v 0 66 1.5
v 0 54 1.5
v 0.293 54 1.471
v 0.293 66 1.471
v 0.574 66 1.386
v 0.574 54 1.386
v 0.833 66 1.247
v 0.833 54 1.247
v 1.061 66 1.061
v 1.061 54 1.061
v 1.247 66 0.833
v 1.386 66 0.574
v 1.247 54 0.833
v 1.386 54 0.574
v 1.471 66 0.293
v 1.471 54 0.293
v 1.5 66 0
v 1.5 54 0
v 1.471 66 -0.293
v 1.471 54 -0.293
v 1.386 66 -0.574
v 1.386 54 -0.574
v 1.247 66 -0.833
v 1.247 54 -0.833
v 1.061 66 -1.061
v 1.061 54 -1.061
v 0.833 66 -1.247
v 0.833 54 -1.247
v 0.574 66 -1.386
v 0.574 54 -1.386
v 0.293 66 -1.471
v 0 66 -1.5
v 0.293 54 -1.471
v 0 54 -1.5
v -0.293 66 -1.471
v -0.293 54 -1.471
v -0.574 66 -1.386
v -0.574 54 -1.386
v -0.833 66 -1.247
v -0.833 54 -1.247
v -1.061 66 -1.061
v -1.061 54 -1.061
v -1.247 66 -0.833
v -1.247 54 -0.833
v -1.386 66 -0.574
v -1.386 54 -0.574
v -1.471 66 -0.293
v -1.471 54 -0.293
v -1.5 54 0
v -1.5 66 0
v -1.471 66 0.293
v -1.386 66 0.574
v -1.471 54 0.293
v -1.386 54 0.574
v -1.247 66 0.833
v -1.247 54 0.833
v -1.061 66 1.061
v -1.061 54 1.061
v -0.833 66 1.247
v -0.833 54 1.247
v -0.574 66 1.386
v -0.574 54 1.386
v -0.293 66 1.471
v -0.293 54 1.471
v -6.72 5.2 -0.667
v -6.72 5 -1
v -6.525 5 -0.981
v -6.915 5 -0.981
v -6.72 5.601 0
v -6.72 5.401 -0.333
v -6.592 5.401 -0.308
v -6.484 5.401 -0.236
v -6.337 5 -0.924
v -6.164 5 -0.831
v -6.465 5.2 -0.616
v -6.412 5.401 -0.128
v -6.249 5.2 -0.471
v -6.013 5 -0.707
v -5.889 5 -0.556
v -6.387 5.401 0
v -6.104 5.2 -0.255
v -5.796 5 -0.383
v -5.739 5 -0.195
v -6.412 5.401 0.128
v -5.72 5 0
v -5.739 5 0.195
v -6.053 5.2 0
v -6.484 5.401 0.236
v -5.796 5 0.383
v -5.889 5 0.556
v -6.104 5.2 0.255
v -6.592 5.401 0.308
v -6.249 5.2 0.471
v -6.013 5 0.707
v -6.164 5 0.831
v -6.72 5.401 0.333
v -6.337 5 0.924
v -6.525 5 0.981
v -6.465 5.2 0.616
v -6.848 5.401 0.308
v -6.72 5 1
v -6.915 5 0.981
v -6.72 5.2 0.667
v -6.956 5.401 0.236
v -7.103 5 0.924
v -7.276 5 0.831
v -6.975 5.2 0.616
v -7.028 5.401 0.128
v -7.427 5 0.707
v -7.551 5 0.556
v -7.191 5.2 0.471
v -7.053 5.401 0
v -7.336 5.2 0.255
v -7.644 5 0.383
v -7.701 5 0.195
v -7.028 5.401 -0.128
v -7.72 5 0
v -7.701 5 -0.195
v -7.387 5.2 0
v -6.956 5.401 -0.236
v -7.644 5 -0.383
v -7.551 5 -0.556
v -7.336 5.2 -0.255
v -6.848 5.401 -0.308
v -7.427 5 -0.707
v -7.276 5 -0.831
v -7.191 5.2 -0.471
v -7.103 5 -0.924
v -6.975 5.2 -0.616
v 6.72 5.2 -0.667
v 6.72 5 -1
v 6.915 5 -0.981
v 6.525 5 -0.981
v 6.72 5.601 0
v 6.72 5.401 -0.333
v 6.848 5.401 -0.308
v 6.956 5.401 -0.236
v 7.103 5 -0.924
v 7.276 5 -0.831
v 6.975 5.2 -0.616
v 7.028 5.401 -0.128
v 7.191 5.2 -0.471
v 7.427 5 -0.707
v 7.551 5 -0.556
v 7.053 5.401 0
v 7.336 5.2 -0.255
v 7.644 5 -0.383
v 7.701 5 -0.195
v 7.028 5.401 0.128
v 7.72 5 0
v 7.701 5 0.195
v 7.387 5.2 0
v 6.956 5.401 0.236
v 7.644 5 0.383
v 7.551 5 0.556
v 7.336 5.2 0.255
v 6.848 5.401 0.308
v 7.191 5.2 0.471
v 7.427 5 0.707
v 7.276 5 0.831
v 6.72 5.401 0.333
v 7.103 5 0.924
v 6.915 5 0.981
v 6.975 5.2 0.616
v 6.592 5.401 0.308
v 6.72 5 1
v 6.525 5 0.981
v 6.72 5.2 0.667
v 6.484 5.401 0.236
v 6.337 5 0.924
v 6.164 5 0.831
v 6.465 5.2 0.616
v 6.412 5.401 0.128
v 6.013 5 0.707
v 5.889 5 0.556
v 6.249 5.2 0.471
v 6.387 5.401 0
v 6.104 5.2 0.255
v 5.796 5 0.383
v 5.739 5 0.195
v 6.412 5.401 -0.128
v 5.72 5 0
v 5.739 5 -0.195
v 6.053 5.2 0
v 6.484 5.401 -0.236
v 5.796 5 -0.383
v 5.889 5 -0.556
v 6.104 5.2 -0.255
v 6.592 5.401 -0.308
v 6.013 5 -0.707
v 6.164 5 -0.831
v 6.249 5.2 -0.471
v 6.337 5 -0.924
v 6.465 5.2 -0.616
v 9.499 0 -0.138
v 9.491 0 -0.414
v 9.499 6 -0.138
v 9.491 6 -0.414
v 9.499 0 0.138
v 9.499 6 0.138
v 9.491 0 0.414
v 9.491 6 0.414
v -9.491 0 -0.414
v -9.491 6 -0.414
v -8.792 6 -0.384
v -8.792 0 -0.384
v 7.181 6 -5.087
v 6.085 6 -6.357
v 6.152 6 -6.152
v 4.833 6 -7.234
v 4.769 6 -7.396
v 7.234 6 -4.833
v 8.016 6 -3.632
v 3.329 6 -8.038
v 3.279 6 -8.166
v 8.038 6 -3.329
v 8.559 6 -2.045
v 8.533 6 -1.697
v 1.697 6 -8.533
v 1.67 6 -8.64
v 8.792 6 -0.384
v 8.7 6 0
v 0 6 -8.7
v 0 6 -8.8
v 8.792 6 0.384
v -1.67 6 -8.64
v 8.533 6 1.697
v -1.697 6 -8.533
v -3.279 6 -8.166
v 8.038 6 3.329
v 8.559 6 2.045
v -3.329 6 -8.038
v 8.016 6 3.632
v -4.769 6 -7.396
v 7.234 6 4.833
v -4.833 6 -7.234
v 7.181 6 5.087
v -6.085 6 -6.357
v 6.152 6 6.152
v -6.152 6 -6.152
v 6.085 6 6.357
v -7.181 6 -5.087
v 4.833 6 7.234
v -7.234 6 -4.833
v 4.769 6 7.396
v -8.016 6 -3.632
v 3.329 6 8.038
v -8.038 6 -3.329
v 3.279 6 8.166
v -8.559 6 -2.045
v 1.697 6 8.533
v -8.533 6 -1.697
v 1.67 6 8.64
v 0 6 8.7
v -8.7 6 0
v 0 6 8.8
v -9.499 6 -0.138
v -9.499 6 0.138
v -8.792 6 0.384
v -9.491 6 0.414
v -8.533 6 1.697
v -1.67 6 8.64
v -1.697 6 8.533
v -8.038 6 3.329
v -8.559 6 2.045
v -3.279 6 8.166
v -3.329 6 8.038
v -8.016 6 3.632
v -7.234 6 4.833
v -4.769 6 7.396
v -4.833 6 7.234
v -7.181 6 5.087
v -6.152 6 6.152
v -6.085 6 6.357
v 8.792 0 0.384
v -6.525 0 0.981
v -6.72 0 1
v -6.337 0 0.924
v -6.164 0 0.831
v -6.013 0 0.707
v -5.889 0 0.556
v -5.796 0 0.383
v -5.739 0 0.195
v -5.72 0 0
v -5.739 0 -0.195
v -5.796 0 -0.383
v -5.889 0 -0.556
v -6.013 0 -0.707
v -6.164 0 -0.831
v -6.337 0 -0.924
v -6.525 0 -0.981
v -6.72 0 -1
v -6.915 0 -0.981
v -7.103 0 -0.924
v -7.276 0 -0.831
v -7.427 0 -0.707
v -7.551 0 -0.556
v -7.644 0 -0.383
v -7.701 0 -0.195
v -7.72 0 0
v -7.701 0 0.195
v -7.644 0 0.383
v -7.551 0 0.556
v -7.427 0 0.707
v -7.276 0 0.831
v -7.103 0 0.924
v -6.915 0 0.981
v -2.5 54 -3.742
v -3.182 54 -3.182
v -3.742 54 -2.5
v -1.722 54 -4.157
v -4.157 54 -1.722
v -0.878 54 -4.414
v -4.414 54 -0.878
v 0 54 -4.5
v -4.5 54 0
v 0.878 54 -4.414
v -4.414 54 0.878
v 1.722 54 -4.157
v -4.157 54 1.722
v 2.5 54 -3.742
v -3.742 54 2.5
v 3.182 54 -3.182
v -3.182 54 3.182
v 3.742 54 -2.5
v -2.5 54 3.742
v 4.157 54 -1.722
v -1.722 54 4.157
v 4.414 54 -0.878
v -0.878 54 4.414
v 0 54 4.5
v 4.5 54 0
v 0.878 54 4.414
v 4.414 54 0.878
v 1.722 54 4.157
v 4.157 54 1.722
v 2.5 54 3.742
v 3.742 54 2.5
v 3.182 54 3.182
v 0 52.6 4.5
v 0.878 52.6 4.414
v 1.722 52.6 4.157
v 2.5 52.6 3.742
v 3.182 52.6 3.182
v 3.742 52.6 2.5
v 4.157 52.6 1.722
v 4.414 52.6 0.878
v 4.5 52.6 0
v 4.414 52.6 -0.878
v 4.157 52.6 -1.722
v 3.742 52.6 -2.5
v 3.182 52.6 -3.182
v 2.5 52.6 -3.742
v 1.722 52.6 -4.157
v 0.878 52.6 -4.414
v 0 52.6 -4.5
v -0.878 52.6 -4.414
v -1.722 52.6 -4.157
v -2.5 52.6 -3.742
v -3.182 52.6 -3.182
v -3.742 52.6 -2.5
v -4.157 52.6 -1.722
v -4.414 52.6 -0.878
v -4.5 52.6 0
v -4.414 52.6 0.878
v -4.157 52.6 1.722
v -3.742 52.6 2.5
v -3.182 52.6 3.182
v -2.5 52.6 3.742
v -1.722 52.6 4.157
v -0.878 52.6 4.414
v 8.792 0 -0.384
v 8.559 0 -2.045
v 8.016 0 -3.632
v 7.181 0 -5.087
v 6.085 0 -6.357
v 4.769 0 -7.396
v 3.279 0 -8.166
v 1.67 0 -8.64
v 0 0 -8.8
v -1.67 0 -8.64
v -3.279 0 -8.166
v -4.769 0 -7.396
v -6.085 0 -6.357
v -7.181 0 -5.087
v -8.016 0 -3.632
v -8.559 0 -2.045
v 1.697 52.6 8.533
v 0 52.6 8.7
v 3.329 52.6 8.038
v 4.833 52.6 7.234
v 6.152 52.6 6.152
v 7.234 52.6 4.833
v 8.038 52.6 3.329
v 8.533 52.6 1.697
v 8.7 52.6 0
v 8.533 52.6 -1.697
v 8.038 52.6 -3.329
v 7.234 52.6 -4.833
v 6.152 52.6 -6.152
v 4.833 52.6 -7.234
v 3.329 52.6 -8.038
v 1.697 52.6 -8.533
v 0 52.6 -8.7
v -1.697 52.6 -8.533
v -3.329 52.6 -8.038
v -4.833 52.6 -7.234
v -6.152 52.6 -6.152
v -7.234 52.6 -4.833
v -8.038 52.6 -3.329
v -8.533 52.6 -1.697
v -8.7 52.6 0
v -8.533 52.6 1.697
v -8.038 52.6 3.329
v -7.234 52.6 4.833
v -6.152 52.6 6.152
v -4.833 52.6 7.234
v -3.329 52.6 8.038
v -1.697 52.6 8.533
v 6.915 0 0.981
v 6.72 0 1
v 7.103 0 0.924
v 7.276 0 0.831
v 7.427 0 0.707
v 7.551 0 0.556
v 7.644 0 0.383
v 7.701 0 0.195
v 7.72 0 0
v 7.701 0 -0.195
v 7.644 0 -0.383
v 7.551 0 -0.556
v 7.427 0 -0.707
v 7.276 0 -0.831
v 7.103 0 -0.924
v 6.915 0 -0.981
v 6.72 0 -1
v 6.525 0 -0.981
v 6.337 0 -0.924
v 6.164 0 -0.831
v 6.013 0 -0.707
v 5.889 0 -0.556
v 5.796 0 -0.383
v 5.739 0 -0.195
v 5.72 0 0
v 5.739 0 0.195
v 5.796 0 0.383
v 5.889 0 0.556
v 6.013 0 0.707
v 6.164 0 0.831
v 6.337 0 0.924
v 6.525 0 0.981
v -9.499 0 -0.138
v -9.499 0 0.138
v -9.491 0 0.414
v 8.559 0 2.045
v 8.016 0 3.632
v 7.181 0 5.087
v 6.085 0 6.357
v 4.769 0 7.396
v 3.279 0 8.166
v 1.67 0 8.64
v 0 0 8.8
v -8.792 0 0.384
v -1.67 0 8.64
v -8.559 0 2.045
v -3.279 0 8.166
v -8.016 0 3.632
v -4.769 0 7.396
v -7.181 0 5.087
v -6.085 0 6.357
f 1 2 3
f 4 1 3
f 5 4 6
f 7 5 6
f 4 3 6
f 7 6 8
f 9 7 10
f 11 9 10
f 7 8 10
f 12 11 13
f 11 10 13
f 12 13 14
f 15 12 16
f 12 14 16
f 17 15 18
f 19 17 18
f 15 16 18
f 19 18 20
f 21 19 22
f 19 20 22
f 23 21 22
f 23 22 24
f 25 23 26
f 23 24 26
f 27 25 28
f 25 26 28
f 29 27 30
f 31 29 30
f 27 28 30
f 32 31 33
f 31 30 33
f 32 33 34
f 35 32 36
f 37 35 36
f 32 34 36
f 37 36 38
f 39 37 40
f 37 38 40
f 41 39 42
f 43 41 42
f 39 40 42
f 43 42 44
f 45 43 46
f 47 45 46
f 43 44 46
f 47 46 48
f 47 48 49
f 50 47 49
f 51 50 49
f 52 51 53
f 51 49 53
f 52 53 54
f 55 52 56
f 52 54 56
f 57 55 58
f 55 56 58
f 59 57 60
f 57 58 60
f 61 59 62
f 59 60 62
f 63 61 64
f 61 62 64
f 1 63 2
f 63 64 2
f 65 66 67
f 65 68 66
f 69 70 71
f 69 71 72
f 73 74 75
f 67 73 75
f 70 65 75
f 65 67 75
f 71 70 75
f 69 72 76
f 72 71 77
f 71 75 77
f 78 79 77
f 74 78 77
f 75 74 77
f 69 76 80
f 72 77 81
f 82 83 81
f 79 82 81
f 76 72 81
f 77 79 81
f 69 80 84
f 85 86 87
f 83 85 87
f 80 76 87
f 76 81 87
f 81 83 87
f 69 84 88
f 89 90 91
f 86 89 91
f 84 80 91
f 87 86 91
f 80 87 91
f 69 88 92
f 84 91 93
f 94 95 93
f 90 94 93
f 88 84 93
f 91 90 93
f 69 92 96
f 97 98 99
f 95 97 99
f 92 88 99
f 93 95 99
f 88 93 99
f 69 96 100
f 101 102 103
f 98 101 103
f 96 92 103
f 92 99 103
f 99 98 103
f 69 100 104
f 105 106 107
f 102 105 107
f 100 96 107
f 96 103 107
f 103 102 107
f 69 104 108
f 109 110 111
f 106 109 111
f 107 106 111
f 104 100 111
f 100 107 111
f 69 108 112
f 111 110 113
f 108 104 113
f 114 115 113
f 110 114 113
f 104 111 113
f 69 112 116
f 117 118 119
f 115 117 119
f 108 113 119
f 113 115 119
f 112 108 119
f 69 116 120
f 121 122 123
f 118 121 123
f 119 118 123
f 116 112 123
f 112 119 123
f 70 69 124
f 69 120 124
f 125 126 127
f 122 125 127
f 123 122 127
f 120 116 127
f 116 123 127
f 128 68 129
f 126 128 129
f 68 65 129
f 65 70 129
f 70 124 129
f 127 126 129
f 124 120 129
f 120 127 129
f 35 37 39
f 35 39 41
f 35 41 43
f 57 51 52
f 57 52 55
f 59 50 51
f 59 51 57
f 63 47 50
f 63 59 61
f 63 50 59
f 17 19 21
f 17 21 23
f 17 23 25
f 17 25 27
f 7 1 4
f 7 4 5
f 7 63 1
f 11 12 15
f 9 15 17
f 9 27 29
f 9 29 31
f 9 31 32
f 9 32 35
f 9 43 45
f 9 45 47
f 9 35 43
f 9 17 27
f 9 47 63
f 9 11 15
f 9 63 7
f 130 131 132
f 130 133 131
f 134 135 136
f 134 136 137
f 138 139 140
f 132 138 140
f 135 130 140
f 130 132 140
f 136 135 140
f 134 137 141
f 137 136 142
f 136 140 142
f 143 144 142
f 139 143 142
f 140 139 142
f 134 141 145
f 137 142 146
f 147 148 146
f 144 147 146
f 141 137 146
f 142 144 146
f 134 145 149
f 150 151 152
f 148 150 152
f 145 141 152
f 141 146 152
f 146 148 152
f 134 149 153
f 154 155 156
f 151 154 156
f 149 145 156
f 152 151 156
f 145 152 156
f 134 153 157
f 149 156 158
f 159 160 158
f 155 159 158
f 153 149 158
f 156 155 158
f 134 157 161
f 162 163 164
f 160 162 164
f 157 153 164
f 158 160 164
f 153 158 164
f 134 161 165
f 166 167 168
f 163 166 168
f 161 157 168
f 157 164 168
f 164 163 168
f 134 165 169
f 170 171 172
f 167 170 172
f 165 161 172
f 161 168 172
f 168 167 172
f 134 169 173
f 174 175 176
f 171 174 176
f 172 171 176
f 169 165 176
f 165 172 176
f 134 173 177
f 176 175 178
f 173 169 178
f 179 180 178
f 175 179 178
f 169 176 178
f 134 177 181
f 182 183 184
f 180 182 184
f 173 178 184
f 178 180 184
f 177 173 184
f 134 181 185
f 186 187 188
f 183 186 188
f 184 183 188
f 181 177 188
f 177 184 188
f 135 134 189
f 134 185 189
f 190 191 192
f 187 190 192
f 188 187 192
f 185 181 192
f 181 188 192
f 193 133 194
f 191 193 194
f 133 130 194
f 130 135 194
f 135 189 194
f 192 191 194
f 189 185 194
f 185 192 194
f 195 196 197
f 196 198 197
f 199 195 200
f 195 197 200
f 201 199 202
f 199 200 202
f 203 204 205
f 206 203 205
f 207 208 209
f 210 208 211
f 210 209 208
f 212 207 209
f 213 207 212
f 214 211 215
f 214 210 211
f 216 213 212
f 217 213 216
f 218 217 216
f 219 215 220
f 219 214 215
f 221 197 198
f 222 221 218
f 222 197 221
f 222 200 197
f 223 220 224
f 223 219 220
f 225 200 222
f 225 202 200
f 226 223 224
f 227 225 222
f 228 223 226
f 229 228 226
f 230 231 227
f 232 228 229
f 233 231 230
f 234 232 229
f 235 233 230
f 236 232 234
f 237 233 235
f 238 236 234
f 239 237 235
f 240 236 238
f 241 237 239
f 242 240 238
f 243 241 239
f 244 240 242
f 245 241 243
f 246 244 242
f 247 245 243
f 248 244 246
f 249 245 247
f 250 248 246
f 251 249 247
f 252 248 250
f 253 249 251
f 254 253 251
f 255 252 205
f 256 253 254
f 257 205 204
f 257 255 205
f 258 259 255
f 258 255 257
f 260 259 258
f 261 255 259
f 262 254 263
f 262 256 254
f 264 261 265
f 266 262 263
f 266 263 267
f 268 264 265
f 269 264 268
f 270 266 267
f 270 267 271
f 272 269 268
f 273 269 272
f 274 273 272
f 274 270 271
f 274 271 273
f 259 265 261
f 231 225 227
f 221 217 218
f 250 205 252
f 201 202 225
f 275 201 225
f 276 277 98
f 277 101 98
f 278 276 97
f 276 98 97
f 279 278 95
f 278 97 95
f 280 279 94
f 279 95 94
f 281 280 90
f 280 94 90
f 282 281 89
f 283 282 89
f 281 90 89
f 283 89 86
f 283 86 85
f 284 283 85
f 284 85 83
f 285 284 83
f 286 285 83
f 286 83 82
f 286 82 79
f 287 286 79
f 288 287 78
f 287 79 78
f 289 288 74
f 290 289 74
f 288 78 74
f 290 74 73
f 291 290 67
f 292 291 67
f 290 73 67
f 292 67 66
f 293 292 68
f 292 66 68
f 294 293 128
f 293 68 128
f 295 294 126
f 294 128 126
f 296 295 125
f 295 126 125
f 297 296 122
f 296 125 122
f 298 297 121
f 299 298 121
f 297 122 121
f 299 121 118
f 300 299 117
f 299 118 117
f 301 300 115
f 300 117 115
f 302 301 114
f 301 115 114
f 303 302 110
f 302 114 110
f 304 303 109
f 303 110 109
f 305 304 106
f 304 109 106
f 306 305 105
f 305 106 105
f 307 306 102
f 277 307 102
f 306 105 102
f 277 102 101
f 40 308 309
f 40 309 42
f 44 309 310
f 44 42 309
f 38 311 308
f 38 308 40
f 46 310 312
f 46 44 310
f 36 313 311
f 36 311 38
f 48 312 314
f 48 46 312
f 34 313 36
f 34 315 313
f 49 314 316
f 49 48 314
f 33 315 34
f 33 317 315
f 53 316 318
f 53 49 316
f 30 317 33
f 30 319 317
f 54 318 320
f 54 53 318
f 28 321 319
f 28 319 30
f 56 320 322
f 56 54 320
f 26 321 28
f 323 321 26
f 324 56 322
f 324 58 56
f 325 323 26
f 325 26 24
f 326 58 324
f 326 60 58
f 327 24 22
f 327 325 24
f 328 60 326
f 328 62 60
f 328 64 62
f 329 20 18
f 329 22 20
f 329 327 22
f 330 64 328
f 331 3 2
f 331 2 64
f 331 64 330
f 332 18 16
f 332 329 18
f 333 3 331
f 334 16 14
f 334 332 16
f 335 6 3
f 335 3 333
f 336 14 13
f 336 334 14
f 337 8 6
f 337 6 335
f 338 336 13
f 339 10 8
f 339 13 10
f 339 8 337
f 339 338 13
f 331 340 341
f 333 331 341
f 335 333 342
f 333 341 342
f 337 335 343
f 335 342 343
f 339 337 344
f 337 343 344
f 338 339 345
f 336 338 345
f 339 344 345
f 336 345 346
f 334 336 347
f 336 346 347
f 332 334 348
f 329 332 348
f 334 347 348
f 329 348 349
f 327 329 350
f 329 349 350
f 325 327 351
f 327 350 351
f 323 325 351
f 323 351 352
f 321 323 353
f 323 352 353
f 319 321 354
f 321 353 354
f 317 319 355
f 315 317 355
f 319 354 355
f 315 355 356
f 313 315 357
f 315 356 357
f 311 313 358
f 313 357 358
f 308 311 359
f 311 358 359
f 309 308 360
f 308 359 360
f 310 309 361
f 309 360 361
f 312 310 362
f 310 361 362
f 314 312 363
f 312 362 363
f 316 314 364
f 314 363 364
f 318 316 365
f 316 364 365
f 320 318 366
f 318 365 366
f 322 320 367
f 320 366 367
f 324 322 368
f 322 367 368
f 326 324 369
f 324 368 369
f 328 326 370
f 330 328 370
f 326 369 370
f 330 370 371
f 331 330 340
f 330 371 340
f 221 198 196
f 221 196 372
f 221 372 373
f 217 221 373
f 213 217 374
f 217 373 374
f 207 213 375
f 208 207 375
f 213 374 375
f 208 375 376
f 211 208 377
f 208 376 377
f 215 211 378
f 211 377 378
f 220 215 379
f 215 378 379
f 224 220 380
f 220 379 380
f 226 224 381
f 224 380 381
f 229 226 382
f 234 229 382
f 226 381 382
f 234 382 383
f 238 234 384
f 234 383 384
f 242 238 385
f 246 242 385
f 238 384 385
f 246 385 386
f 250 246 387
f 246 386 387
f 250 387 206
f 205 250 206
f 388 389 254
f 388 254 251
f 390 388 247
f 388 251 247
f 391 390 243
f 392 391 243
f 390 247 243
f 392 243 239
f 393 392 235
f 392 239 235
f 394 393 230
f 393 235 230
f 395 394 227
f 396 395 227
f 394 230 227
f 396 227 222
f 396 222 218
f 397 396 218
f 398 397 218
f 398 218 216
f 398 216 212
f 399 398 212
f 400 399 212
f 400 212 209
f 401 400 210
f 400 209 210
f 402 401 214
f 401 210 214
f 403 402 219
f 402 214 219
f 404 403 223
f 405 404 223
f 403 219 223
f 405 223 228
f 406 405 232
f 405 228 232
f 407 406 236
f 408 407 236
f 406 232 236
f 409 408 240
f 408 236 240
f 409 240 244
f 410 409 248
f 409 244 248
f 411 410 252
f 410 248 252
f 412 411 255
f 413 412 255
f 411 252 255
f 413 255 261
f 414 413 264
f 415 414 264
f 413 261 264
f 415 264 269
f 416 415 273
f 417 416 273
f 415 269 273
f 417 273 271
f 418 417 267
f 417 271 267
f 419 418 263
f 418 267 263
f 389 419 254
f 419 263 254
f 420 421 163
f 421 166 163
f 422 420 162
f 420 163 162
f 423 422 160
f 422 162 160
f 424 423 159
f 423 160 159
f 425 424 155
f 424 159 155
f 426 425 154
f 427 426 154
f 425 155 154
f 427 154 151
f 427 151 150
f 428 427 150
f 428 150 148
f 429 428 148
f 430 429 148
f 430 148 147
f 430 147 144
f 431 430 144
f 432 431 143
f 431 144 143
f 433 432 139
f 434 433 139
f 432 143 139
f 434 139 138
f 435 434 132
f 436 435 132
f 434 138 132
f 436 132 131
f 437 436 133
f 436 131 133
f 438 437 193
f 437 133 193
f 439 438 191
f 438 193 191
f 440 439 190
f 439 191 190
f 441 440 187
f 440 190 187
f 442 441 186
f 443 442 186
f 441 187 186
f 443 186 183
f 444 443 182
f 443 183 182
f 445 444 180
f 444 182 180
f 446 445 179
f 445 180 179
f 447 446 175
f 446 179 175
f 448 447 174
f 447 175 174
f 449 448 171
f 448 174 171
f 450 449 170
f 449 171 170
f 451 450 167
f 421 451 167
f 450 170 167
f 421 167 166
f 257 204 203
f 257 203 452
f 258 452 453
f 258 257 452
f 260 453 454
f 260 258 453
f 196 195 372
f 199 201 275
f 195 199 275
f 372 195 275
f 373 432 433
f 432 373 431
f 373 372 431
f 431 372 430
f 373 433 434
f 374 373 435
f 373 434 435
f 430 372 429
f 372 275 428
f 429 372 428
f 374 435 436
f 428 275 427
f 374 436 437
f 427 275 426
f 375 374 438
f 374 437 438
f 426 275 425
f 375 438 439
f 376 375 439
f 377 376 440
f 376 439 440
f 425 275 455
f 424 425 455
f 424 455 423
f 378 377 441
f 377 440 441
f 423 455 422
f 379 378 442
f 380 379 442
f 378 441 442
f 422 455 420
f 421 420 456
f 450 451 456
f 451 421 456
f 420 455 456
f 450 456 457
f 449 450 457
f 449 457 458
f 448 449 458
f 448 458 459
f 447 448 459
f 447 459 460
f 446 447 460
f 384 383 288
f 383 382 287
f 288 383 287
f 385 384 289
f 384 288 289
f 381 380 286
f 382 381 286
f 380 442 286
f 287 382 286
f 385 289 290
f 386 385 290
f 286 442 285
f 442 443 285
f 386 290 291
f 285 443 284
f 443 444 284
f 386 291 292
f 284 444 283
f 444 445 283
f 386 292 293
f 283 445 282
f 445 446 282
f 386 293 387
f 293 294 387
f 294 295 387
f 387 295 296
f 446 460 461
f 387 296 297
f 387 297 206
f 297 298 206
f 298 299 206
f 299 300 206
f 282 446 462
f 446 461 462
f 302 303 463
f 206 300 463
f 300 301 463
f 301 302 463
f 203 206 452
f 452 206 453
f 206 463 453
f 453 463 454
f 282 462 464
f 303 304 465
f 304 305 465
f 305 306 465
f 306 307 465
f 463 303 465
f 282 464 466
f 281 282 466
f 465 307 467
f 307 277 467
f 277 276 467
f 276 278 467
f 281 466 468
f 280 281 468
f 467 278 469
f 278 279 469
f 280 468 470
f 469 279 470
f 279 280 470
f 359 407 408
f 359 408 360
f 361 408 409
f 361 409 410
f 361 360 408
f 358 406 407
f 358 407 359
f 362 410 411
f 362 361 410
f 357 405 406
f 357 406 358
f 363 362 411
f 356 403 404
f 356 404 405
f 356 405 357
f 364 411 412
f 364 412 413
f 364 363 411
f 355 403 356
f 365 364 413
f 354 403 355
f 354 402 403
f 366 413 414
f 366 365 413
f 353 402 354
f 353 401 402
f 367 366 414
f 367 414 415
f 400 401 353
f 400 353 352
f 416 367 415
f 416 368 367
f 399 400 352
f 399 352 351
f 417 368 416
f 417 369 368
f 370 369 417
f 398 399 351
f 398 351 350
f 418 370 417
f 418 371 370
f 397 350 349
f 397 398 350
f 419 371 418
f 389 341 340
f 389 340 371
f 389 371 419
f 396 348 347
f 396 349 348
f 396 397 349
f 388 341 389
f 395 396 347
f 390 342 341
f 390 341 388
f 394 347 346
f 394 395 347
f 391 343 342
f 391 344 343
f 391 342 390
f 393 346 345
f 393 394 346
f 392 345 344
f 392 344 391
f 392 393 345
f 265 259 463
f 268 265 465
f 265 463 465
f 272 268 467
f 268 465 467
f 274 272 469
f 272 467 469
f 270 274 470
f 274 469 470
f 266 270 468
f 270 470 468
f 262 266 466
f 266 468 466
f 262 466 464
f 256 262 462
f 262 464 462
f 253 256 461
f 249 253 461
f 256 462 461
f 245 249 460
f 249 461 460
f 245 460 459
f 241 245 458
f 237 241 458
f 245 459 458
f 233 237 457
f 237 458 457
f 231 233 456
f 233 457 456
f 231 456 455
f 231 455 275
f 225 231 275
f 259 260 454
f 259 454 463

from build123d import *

# Parameters (mm, degrees)
SKETCH_1_R               = 8.8
EXTRUDE_1_DEPTH          = 6
SKETCH_6_W               = 0.7
SKETCH_6_H               = 6
REVOLVE_1_ANGLE          = 5
PATTERN_CIRCULAR_5_COUNT = 2
SKETCH_7_R               = 8.7
EXTRUDE_10_DEPTH         = 46.6
SKETCH_8_R               = 4.5
EXTRUDE_11_DEPTH         = 1.4
SKETCH_9_R               = 1.5
EXTRUDE_12_DEPTH         = 12
F_2_0MM_1_D              = 2
F_2_0MM_1_DEPTH          = 5
F_2_0MM_1_TIP            = 0.600860619
F_2_0MM_2_D              = 2
F_2_0MM_2_DEPTH          = 5
F_2_0MM_2_TIP            = 0.600860619


with BuildPart() as part:
    # 草图1 → 凸台-拉伸1 (new body)
    with BuildSketch(Plane(origin=(0, 0, 0), x_dir=(1, 0, 0), z_dir=(0, 1, 0))):
        with Locations(Location((0, 0, 0), (0, 0, 270))):
            Circle(SKETCH_1_R)
    extrude(amount=EXTRUDE_1_DEPTH)

    # 草图6 → 旋转1 (revolve, symmetric)
    with BuildSketch(Plane.XY) as revolve_1_sk:
        with Locations((-9.15, 3)):
            Rectangle(SKETCH_6_W, SKETCH_6_H)
    revolve_1 = revolve(axis=Axis((0, 1.183639986, 0), (0, -1, 0)), revolution_arc=REVOLVE_1_ANGLE / 2)
    revolve_1 = revolve_1 + revolve(revolve_1_sk.sketch, axis=Axis((0, 1.183639986, 0), (0, 1, 0)), revolution_arc=REVOLVE_1_ANGLE / 2)

    # 阵列(圆周)5: 旋转1 ×2 about axis
    pattern_circular_5_axis = Axis((0, 0, 0), (0, 1, 0))
    for i in range(1, PATTERN_CIRCULAR_5_COUNT):
        add(revolve_1.rotate(pattern_circular_5_axis, i * 360 / PATTERN_CIRCULAR_5_COUNT))

    # 草图7 → 凸台-拉伸10 (add)
    with BuildSketch(Plane(origin=(0, 6, 0), x_dir=(1, 0, 0), z_dir=(0, 1, 0))):
        with Locations(Location((0, 0, 0), (0, 0, 270))):
            Circle(SKETCH_7_R)
    extrude(amount=EXTRUDE_10_DEPTH)

    # 草图8 → 凸台-拉伸11 (add)
    with BuildSketch(Plane(origin=(0, 52.6, 0), x_dir=(1, 0, 0), z_dir=(0, 1, 0))):
        with Locations(Location((0, 0, 0), (0, 0, 270))):
            Circle(SKETCH_8_R)
    extrude(amount=EXTRUDE_11_DEPTH)

    # 草图9 → 凸台-拉伸12 (add)
    with BuildSketch(Plane(origin=(0, 54, 0), x_dir=(1, 0, 0), z_dir=(0, 1, 0))):
        with Locations(Location((0, 0, 0), (0, 0, 270))):
            Circle(SKETCH_9_R)
    extrude(amount=EXTRUDE_12_DEPTH)

    # Ø2.0mm 暗销孔1
    with Locations(Plane(origin=(-6.72, 0, 0), x_dir=(0, 0, -1), z_dir=(0, -1, 0))):
        with Locations((0, 0)):
            Hole(F_2_0MM_1_D / 2, depth=F_2_0MM_1_DEPTH)
            with Locations((0, 0, -(F_2_0MM_1_DEPTH + F_2_0MM_1_TIP / 2))):  # 118° drill point
                Cone(0, F_2_0MM_1_D / 2, F_2_0MM_1_TIP, mode=Mode.SUBTRACT)

    # Ø2.0mm 暗销孔2
    with Locations(Plane(origin=(6.72, 0, 0), x_dir=(0, 0, -1), z_dir=(0, -1, 0))):
        with Locations((0, 0)):
            Hole(F_2_0MM_2_D / 2, depth=F_2_0MM_2_DEPTH)
            with Locations((0, 0, -(F_2_0MM_2_DEPTH + F_2_0MM_2_TIP / 2))):  # 118° drill point
                Cone(0, F_2_0MM_2_D / 2, F_2_0MM_2_TIP, mode=Mode.SUBTRACT)


solid = part.part
